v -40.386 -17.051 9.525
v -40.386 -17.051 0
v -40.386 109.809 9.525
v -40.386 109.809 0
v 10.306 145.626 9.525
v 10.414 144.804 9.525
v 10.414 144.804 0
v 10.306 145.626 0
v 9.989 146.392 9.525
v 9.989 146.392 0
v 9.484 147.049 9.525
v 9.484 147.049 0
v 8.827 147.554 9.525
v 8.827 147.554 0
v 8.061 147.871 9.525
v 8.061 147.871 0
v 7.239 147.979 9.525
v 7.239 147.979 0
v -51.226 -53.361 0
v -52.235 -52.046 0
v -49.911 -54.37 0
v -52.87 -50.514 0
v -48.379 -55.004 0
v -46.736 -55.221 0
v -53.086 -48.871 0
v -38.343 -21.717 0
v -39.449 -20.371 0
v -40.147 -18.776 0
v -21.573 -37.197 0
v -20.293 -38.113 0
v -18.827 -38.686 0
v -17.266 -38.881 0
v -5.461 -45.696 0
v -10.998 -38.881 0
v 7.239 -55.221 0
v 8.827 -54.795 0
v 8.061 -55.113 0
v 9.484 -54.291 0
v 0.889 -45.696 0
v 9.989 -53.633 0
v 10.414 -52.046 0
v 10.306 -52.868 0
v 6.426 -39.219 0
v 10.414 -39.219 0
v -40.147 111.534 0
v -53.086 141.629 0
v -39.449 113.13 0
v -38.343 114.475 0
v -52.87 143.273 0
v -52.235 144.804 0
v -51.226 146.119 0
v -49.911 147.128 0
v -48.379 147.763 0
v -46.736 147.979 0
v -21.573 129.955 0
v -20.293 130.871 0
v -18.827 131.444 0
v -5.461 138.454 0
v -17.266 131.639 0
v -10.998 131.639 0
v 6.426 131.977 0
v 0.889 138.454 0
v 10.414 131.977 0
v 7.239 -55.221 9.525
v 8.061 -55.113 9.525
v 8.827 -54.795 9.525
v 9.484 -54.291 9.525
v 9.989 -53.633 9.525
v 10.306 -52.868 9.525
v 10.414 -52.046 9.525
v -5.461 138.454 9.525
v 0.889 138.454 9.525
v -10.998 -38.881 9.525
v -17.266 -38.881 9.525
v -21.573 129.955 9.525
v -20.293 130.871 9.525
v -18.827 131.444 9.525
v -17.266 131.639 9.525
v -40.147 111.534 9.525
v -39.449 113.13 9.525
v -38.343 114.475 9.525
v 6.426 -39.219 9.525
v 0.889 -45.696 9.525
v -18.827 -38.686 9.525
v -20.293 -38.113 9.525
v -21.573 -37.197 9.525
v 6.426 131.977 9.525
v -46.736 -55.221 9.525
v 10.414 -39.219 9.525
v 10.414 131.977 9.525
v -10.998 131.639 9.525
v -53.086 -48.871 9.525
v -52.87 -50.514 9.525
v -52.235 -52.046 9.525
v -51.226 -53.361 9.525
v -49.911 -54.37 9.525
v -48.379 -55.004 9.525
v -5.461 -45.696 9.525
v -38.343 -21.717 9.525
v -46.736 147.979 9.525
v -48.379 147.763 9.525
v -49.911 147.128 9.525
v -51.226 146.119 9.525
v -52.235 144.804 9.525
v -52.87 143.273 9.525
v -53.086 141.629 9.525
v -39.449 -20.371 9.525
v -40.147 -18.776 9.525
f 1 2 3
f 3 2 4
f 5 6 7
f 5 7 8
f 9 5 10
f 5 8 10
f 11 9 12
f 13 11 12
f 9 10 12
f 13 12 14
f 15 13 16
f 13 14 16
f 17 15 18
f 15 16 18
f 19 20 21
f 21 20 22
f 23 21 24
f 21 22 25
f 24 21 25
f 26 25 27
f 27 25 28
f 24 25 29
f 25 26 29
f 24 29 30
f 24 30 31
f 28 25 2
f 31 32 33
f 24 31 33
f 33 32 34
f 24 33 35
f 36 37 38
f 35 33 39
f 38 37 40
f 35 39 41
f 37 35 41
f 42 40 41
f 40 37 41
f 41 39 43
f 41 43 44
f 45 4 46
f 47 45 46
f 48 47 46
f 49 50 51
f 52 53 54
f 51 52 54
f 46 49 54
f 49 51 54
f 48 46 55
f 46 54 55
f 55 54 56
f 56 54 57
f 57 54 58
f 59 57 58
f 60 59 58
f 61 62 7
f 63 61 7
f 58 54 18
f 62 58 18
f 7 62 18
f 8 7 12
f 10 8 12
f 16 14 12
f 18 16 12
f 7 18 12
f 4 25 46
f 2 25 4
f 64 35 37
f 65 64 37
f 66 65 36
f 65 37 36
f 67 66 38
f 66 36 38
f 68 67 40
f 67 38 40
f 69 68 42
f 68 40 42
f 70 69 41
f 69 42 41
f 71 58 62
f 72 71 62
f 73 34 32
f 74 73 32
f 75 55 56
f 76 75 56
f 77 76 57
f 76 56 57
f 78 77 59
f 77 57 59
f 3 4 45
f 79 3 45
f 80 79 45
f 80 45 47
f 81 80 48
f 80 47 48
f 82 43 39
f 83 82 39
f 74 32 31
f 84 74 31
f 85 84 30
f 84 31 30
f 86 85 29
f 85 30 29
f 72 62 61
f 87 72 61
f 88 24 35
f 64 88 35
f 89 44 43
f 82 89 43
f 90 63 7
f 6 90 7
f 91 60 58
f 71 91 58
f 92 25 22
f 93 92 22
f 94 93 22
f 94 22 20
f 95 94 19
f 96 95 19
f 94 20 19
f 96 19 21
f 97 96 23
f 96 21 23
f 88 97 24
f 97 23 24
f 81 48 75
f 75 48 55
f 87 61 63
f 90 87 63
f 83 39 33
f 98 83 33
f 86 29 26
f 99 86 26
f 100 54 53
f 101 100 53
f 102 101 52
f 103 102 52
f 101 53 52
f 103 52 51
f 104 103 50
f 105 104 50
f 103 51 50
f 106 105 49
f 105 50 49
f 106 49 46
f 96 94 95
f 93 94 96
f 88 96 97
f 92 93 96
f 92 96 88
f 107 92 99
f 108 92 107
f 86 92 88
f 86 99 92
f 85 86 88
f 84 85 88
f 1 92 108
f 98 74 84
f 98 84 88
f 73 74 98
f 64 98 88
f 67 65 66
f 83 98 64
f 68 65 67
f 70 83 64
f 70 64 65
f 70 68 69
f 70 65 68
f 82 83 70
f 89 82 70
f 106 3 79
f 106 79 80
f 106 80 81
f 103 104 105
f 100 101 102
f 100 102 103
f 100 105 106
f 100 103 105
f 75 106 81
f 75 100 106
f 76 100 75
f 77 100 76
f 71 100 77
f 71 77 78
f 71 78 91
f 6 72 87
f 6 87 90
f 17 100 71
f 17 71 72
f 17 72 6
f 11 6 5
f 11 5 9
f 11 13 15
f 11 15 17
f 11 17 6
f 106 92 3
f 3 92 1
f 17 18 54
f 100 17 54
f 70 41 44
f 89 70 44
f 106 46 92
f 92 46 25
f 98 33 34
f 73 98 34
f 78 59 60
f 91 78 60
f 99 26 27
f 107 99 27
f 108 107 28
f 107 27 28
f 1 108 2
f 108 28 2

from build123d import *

# Parameters (mm, degrees)
F1_DEPTH = 9.525


with BuildPart() as f1:
    # F0 (on Top) → F1 (new body)
    with BuildSketch(Plane.XY):
        with BuildLine():
            Line((-2.285999, 147.979229), (-46.735999, 147.979229))
            ThreePointArc((-46.735999, 147.979229), (-51.226127, 146.119357), (-53.085999, 141.629229))
            Line((-53.085999, 141.629229), (-53.085999, -48.870771))
            ThreePointArc((-53.085999, -48.870771), (-51.226127, -53.360899), (-46.735999, -55.220771))
            Line((-46.735999, -55.220771), (-2.285999, -55.220771))
            Line((-2.285999, -55.220771), (7.239001, -55.220771))
            ThreePointArc((7.239001, -55.220771), (9.484065, -54.290835), (10.414001, -52.045771))
            Line((10.414001, -52.045771), (10.414001, -39.218631))
            Line((10.414001, -39.218631), (6.426201, -39.218631))
            Line((6.426201, -39.218631), (0.889001, -45.695771))
            Line((0.889001, -45.695771), (-5.460999, -45.695771))
            Line((-5.460999, -45.695771), (-10.998199, -38.880926))
            Line((-10.998199, -38.880926), (-17.265751, -38.880926))
            ThreePointArc((-17.265751, -38.880926), (-19.578043, -38.444961), (-21.57283, -37.196928))
            Line((-21.57283, -37.196928), (-38.343077, -21.7167))
            ThreePointArc((-38.343077, -21.7167), (-39.85289, -19.597514), (-40.385999, -17.050698))
            Line((-40.385999, -17.050698), (-40.385999, 109.809156))
            ThreePointArc((-40.385999, 109.809156), (-39.85289, 112.355972), (-38.343077, 114.475157))
            Line((-38.343077, 114.475157), (-21.57283, 129.955386))
            ThreePointArc((-21.57283, 129.955386), (-19.578043, 131.203419), (-17.265751, 131.639384))
            Line((-17.265751, 131.639384), (-10.998199, 131.639384))
            Line((-10.998199, 131.639384), (-5.460999, 138.454229))
            Line((-5.460999, 138.454229), (0.889001, 138.454229))
            Line((0.889001, 138.454229), (6.426201, 131.977089))
            Line((6.426201, 131.977089), (10.414001, 131.977089))
            Line((10.414001, 131.977089), (10.414001, 144.804229))
            ThreePointArc((10.414001, 144.804229), (9.484065, 147.049293), (7.239001, 147.979229))
            Line((7.239001, 147.979229), (-2.285999, 147.979229))
        make_face()
    extrude(amount=F1_DEPTH)


solid = f1.part
